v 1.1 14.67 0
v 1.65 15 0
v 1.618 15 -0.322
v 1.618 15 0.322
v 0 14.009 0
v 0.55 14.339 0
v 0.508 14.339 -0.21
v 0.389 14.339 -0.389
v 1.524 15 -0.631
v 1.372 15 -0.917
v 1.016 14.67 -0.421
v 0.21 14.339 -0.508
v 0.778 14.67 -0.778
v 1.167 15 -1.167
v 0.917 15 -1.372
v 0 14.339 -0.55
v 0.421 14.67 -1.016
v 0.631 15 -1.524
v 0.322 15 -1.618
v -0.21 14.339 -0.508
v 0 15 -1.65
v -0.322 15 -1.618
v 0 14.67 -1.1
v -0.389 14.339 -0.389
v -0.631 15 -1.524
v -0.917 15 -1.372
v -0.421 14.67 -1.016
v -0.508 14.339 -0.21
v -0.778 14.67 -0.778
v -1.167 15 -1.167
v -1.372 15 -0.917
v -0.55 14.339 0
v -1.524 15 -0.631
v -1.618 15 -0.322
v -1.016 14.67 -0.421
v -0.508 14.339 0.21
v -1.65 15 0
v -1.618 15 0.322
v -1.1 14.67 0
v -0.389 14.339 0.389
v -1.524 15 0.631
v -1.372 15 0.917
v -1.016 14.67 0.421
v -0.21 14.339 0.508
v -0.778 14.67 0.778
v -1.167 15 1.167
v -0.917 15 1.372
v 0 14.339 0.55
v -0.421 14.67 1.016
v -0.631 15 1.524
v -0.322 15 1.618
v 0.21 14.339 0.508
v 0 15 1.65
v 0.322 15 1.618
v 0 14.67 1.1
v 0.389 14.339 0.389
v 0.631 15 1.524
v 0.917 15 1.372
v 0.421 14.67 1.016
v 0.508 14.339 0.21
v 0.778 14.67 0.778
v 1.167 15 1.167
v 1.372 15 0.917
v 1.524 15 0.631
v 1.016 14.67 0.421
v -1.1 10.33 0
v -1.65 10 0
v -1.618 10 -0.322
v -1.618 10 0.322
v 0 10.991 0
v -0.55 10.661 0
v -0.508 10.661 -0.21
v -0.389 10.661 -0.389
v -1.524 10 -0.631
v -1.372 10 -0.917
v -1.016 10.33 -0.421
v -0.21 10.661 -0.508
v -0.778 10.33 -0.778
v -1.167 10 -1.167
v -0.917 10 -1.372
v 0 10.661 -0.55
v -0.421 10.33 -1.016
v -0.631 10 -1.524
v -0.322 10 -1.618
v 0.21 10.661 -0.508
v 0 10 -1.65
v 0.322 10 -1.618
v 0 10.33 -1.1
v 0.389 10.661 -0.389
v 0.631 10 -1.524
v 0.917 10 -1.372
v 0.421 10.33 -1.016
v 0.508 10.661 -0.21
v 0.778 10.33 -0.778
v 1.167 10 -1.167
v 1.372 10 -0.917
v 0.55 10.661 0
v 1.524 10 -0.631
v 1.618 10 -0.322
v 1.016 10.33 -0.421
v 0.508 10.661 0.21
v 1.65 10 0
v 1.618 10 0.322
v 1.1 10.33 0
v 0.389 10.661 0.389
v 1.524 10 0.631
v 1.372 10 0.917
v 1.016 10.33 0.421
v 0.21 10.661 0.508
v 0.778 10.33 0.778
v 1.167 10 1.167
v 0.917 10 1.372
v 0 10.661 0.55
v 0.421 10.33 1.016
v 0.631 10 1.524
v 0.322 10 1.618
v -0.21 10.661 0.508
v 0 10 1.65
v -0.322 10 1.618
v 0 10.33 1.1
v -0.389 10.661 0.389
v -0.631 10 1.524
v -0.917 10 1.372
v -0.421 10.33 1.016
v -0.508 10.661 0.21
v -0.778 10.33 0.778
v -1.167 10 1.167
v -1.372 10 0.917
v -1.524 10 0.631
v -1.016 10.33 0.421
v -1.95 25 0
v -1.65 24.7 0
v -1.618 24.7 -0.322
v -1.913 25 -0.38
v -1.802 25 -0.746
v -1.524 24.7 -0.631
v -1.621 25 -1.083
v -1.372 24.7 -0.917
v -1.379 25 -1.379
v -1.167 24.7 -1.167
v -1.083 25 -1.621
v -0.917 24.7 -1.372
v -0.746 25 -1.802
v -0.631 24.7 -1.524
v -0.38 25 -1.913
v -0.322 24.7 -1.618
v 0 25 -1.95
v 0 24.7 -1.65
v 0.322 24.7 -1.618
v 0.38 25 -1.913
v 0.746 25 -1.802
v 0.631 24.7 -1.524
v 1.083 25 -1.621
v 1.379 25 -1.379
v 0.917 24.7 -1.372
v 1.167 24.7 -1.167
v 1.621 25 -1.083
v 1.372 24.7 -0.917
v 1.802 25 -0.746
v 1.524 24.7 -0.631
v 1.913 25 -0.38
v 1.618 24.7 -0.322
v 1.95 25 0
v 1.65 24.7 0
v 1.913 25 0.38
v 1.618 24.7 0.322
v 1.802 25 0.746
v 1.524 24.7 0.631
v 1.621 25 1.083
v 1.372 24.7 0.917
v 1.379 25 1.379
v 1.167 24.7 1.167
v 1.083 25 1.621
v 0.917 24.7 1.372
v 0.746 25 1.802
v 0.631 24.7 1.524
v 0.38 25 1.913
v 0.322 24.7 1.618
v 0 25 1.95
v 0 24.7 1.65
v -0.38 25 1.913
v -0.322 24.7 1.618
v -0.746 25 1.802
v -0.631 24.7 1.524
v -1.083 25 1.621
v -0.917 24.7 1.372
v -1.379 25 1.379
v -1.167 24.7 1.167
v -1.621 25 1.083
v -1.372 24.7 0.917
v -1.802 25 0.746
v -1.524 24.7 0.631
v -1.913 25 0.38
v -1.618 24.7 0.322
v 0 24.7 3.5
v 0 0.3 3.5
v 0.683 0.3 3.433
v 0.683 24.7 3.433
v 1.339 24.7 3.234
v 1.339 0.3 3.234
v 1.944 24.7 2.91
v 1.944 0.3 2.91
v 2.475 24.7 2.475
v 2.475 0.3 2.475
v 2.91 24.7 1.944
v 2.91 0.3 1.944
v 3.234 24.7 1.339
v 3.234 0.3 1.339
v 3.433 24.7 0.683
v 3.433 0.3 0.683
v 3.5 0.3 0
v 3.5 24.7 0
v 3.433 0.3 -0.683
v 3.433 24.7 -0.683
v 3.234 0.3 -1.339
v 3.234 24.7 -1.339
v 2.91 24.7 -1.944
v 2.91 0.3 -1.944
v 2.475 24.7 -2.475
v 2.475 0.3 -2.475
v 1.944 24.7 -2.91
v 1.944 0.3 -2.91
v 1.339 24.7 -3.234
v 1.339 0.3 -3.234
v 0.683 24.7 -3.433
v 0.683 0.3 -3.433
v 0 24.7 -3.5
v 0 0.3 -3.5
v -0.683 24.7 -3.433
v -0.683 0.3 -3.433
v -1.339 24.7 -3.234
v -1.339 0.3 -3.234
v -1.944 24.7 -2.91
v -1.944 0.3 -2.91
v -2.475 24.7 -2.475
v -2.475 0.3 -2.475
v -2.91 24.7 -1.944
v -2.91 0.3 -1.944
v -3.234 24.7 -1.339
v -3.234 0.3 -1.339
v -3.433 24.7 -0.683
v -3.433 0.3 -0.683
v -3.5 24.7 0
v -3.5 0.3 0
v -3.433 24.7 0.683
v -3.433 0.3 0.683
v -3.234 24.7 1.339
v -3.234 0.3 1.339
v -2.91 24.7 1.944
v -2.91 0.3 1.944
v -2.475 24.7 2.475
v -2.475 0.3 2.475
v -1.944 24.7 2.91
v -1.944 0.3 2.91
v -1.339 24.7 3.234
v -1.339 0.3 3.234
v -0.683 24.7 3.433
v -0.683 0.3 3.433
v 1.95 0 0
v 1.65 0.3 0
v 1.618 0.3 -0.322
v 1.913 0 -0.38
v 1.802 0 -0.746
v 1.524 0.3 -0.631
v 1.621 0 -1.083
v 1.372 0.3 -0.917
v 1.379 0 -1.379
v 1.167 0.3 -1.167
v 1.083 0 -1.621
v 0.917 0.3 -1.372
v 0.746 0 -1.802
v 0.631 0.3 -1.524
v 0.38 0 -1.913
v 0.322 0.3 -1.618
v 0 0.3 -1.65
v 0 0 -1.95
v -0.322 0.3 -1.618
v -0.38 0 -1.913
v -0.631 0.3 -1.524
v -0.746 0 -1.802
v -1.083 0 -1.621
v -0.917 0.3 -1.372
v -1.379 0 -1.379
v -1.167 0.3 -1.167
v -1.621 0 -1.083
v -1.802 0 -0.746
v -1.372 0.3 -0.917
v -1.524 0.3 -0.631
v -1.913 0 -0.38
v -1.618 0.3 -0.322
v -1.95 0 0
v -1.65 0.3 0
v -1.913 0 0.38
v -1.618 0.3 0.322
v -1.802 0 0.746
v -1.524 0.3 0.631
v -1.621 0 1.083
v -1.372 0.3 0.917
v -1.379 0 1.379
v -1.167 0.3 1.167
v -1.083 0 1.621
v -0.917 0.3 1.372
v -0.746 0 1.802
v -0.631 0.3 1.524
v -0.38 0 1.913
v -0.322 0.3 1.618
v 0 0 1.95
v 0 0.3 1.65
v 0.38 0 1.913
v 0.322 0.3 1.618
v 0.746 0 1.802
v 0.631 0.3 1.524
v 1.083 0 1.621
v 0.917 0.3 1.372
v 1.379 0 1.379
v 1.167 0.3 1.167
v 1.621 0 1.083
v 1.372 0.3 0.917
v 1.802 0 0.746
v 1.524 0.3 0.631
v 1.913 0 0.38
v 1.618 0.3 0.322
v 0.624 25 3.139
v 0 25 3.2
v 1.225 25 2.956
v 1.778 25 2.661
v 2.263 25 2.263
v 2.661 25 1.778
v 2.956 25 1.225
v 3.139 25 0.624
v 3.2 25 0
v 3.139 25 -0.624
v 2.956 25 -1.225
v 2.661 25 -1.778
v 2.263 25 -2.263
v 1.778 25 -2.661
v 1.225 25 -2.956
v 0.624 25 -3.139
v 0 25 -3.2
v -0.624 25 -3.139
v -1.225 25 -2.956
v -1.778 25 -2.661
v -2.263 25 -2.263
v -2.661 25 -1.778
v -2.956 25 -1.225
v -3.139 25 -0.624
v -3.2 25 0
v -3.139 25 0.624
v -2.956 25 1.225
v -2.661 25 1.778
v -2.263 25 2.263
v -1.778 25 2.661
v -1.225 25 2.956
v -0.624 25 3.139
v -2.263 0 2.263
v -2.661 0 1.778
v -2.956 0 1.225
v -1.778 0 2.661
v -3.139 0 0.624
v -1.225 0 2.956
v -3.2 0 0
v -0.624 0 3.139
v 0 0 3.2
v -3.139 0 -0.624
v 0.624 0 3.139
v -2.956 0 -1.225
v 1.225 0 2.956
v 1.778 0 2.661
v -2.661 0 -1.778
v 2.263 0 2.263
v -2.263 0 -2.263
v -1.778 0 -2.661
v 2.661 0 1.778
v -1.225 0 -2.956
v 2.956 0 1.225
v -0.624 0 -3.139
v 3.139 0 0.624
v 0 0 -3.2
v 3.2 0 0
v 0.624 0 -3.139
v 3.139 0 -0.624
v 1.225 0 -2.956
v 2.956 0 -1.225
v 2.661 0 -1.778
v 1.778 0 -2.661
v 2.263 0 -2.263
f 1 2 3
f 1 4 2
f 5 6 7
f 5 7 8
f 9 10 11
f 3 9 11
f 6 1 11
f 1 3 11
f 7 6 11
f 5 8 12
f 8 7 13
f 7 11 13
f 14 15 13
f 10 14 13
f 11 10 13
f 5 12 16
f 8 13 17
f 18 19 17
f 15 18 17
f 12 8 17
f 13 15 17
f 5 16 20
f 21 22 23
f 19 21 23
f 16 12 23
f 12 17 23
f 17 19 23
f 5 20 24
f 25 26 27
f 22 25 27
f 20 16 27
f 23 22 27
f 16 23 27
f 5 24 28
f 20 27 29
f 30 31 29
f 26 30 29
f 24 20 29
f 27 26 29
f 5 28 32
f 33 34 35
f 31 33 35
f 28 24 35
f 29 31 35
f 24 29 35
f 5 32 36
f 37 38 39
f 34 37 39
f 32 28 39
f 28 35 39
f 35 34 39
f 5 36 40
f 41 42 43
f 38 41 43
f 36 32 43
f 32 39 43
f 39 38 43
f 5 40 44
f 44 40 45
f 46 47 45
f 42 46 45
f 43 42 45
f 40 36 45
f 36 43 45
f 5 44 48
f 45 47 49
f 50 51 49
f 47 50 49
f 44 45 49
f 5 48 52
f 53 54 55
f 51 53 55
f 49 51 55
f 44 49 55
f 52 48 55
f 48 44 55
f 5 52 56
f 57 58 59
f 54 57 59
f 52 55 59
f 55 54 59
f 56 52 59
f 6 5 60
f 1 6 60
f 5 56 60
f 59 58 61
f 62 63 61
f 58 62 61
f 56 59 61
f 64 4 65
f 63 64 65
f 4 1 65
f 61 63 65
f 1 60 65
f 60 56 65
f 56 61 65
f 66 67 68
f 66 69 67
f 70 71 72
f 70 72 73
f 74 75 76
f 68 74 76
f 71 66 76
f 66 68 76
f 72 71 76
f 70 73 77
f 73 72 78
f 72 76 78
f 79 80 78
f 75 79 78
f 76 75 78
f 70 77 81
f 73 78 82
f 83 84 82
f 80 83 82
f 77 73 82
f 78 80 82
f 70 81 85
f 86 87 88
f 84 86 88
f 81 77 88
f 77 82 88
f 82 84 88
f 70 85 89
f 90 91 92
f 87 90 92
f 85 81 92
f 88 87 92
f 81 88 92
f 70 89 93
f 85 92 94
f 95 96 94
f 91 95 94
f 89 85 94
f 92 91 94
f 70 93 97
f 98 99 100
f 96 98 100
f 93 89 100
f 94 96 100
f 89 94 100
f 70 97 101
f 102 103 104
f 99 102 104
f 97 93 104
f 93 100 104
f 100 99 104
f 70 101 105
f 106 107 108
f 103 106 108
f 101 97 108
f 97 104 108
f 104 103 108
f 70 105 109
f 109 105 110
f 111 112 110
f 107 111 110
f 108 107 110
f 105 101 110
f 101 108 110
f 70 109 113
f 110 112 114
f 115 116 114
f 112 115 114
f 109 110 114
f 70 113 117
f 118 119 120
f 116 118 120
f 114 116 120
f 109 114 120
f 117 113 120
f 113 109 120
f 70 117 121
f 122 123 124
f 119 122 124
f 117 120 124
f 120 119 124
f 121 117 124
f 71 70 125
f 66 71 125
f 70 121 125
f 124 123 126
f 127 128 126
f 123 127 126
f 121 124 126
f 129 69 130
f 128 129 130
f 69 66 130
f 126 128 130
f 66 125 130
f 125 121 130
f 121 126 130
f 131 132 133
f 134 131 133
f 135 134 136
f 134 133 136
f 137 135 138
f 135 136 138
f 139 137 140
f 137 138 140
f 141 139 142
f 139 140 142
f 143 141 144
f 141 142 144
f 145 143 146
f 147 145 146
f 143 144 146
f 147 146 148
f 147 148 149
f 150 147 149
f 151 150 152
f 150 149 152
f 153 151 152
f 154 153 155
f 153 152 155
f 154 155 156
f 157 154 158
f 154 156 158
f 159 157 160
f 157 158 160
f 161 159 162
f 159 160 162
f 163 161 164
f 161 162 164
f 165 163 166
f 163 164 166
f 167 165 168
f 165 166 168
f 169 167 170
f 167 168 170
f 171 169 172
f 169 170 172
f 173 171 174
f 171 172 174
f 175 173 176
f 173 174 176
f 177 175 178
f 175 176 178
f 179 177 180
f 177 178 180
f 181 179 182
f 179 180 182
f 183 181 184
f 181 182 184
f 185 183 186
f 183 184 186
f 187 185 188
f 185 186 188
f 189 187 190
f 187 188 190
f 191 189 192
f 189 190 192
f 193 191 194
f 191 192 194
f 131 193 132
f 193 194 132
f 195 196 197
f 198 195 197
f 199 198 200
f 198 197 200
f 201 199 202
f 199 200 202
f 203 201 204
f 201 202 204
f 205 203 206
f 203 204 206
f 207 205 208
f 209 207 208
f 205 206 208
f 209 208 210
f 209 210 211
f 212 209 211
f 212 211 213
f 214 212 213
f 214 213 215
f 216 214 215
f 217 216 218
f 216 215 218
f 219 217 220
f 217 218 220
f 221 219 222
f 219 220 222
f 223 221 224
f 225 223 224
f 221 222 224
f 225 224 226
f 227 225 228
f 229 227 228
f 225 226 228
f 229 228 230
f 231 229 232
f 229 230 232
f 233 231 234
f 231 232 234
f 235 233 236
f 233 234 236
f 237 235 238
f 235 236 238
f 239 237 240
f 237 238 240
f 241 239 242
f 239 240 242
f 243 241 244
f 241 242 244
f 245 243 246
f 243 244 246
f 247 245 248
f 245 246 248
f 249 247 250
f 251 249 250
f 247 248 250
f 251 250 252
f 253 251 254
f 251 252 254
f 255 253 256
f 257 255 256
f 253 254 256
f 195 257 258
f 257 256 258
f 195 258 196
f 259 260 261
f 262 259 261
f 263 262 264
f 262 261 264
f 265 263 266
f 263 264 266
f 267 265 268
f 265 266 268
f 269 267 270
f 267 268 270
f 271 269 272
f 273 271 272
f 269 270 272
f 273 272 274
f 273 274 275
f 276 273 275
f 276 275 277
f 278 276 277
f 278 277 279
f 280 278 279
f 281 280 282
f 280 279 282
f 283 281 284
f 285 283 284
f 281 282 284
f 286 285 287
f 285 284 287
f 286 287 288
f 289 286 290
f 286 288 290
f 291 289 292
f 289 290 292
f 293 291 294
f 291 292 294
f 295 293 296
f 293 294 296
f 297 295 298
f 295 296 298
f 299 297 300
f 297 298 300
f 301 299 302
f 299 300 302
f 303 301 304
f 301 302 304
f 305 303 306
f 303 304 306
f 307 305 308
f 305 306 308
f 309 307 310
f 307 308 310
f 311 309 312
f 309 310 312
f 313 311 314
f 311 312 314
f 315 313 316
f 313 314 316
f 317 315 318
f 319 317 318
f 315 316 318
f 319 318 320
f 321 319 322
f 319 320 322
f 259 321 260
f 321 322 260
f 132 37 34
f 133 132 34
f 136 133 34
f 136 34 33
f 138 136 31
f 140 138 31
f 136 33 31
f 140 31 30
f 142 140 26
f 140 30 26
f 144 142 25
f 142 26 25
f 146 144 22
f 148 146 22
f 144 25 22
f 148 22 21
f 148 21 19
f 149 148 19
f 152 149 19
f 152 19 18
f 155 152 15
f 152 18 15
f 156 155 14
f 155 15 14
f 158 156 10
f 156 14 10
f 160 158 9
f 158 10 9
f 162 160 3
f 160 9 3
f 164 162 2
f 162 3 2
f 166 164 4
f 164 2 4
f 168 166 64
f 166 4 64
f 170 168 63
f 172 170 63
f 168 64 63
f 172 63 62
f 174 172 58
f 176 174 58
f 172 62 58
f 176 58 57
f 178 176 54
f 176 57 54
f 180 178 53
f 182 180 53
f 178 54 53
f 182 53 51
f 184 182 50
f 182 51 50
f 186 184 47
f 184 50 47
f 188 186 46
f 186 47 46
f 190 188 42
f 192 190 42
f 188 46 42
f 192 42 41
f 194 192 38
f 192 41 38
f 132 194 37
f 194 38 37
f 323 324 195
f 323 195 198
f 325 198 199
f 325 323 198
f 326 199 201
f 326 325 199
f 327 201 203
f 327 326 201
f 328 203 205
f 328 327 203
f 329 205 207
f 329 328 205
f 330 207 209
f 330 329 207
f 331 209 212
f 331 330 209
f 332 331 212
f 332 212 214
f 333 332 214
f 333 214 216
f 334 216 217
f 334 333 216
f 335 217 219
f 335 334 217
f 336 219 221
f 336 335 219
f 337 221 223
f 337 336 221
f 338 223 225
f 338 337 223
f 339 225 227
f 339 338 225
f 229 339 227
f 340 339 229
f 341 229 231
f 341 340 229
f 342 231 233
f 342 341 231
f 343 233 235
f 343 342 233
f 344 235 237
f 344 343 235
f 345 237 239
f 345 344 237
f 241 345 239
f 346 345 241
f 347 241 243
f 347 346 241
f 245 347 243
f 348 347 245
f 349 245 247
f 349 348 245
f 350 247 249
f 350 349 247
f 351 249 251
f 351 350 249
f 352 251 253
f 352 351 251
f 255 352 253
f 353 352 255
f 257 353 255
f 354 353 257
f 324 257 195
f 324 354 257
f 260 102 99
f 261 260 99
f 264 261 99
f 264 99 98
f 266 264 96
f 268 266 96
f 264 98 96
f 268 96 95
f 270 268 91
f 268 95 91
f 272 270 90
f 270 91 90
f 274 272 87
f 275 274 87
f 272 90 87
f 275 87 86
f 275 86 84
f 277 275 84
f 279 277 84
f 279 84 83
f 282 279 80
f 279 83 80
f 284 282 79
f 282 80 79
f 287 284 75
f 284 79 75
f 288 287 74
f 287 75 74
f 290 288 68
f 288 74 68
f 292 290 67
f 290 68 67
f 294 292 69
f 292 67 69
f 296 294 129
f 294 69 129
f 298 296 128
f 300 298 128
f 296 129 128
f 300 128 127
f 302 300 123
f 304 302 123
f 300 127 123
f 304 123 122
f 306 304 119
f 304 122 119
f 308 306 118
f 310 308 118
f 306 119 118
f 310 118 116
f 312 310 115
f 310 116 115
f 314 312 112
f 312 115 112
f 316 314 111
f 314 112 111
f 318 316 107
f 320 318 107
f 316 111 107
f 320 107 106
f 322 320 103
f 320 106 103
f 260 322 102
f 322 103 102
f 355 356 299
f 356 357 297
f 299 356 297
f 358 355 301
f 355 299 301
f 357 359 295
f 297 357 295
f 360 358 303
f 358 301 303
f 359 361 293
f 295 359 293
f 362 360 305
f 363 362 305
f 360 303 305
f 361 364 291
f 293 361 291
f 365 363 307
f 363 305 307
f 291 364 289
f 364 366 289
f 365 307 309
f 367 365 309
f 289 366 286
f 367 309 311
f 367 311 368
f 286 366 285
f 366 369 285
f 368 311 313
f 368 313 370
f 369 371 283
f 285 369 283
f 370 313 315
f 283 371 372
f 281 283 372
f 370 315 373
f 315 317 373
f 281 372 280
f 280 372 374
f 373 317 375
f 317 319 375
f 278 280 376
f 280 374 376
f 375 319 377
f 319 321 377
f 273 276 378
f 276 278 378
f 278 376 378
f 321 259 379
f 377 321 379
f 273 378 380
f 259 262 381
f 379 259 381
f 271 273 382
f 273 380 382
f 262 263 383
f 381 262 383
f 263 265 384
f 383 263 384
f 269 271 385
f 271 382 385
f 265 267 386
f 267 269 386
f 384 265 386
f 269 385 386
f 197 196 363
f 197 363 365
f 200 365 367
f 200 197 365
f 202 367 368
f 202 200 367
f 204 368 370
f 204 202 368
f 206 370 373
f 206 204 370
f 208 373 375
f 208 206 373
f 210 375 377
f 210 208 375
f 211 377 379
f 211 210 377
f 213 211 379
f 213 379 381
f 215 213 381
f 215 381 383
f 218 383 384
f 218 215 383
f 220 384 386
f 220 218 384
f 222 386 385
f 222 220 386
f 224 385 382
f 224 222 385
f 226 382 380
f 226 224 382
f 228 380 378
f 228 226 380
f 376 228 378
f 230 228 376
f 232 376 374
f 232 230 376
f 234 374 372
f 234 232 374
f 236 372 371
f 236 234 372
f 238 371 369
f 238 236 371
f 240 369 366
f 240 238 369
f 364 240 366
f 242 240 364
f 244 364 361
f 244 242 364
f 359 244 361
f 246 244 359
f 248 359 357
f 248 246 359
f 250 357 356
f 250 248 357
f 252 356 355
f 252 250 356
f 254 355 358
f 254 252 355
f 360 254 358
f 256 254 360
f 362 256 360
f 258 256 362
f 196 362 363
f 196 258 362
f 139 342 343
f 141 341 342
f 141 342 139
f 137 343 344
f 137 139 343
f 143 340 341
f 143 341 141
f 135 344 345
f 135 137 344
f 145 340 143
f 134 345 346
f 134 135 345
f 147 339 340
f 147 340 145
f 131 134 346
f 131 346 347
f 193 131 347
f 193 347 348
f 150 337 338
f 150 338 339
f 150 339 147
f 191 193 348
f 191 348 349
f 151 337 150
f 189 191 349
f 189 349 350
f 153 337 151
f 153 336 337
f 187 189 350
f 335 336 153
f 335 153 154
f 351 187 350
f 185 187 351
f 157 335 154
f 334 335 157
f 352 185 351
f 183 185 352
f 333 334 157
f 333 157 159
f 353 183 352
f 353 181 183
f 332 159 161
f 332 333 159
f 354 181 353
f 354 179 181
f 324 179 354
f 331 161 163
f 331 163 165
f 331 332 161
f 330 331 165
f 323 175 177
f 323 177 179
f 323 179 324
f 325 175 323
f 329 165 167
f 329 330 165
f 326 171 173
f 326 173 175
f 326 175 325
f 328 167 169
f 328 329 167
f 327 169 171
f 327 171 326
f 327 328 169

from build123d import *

# Parameters (mm, degrees)
SKETCH_1_R             = 3.5
SKETCH_1_R_2           = 1.65
EXTRUDE_1_DEPTH        = 25
HOLE_WIZARD_M4_1_D     = 3.3
HOLE_WIZARD_M4_1_DEPTH = 10
HOLE_WIZARD_M4_1_TIP   = 0.991420021
HOLE_WIZARD_M4_2_D     = 3.3
HOLE_WIZARD_M4_2_DEPTH = 10
HOLE_WIZARD_M4_2_TIP   = 0.991420021
CHAMFER_1_SIZE         = 0.3


with BuildPart() as part:
    # 스케치1 → 보스-돌출1 (new body)
    # profile 1 of 2: a face of its own
    with BuildSketch(Plane(origin=(0, 0, 0), x_dir=(1, 0, 0), z_dir=(0, 1, 0))):
        with Locations(Location((0, 0, 0), (0, 0, 270))):
            Circle(SKETCH_1_R)
        Circle(SKETCH_1_R_2, mode=Mode.SUBTRACT)
    # profile 2 of 2: a face of its own
    with BuildSketch(Plane(origin=(0, 0, 0), x_dir=(1, 0, 0), z_dir=(0, 1, 0))):
        Circle(SKETCH_1_R_2)
    extrude(amount=EXTRUDE_1_DEPTH)

    # M4 탭을 위한 탭 드릴1
    with Locations(Plane(origin=(0, 0, 0), x_dir=(-1, 0, 0), z_dir=(0, -1, 0))):
        with Locations((0, 0)):
            Hole(HOLE_WIZARD_M4_1_D / 2, depth=HOLE_WIZARD_M4_1_DEPTH)
            with Locations((0, 0, -(HOLE_WIZARD_M4_1_DEPTH + HOLE_WIZARD_M4_1_TIP / 2))):  # 118° drill point
                Cone(0, HOLE_WIZARD_M4_1_D / 2, HOLE_WIZARD_M4_1_TIP, mode=Mode.SUBTRACT)

    # M4 탭을 위한 탭 드릴2
    with Locations(Plane(origin=(0, 25, 0), x_dir=(1, 0, 0), z_dir=(0, 1, 0))):
        with Locations((0, 0)):
            Hole(HOLE_WIZARD_M4_2_D / 2, depth=HOLE_WIZARD_M4_2_DEPTH)
            with Locations((0, 0, -(HOLE_WIZARD_M4_2_DEPTH + HOLE_WIZARD_M4_2_TIP / 2))):  # 118° drill point
                Cone(0, HOLE_WIZARD_M4_2_D / 2, HOLE_WIZARD_M4_2_TIP, mode=Mode.SUBTRACT)

    # 모따기1
    chamfer_1_edges = [part.edges().sort_by_distance(p)[0] for p in [
        (1.65, 25, 0),
        (0, 0, -3.5),
        (0, 25, -3.5),
        (-1.65, 0, 0),
    ]]
    chamfer(chamfer_1_edges, length=CHAMFER_1_SIZE)


solid = part.part
